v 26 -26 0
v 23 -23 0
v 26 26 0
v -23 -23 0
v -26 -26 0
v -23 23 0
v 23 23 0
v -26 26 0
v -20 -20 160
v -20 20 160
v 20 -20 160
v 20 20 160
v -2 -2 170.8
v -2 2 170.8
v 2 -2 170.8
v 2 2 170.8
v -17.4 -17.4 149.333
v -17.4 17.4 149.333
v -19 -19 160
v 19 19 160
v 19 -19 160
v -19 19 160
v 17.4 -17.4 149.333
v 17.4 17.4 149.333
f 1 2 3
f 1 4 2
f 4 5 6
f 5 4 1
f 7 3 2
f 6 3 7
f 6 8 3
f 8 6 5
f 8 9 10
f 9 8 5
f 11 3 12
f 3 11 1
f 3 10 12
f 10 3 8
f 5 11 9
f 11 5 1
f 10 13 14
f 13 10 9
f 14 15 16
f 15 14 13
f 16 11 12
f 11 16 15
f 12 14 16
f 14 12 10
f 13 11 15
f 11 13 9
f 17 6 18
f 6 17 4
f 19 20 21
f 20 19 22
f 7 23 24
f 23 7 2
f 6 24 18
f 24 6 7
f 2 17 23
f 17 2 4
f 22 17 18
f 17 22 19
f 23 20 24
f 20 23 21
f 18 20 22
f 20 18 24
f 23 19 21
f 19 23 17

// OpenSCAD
// ======================================================
// Dice Tower (tapered shell) + DIAGONAL baffles (wall-to-wall)
// Baffles tilt across X (rotate about Y) and alternate each level
// ======================================================
$fn = 64;

// ---------- Tower geometry ----------
tower_h       = 160;   // body height (not counting cap)
outer_w_bot   = 52;    // outer width at base
outer_w_top   = 40;    // outer width at top
wall          = 3;     // wall thickness
cap_h         = 18;    // little pyramid cap

// Inner chute (constant rectangle, centered)
chute_w       = 32;    // X (give chunky d20s room)
chute_d       = 32;    // Y

// Exit opening (front = +Y)
base_clear_h  = 22;
exit_w        = 34;
exit_h        = 20;

// Funnel at top
funnel_h      = 20;
funnel_over   = 3;

// ---------- Baffles (DIAGONAL across X) ----------
num_baffles       = 6;
baffle_t          = 3.0;   // slightly thicker for robustness
baffle_angle_deg  = 15;     // slope across X (left high → right low, then flip)
baffle_margin     = 10;     // top/bottom margin before first/after last
y_clear_from_wall = 1.5;    // clearance from front/back walls (Y)
 x_overlap         = 1.0;    // small penetration into wall to avoid boolean slivers
baffle_max_width  = 18;     // max baffle width to prevent jamming

// ---------- helpers ----------
module taper(wb, wt, h){ linear_extrude(h, scale=wt/wb) square([wb,wb], center=true); }
function iw_bot() = outer_w_bot - 2*wall;
function iw_top() = outer_w_top - 2*wall;
function inner_w_at_z(z) = iw_bot() + (iw_top() - iw_bot()) * (z / tower_h);

// ---------- outer shell ----------
module outer_shell(){
  union(){
    taper(outer_w_bot, outer_w_top, tower_h);
    // Replace polyhedron cap with a short flat-ish cap to avoid fragile apex
    translate([0,0,tower_h])
      taper(outer_w_top, 4.0, cap_h*0.6); // small flat cap rather than a sharp point
  }
}

// ---------- subtractions ----------
module inner_cavity_taper(){ taper(iw_bot(), iw_top(), tower_h); }
module main_chute(){ linear_extrude(tower_h) square([chute_w, chute_d], center=true); }
module exit_window(){
  translate([0,0,base_clear_h + exit_h/2])
    rotate([90,0,0]) cube([exit_w, wall*2+0.2, exit_h], center=true);
}
module top_funnel(){
  fw_top = chute_w + 2*funnel_over;
  fw_bot = iw_top() - 2;
  fh     = min(funnel_h, tower_h*0.35);
  translate([0,0,tower_h - fh]) taper(fw_bot, fw_top, fh);
}

// ---------- DIAGONAL baffles (tilt across X, alternate) ----------
module baffles_diagonal(){
  usable_h = (tower_h - base_clear_h) - 2*baffle_margin;
  spacing  = usable_h / max(num_baffles,1);

  // size in Y (front/back) – centered with a small gap to both walls
  len_y = chute_d - 2*y_clear_from_wall;

  for(i=[0:num_baffles-1]){
    zc   = base_clear_h + baffle_margin + spacing*(i+0.5);
    iw_z = inner_w_at_z(zc);             // inner width between side walls at this Z

    // PROPER FIX: Baffles must attach to walls to be printable
    // Alternate between left-wall and right-wall attachment
    // Each baffle spans from one wall partway across, leaving flow gap on opposite side
    
    // Safety clamp: ensure flow gap is large enough for common D20s.
    // gap = chute_w - len_x  => enforce gap >= safe_d20 + clearance
    safe_d20   = 22.5;    // typical tip-to-tip diagonal for D20 (mm)
    clearance  = 0.5;     // extra wiggle room (mm)
  // maximum allowed baffle length so the remaining gap fits a D20
  max_len_allowed = max([0, chute_w - (safe_d20 + clearance)]);

  // clamp also by the local inner width at this Z to avoid overhanging into the tapered shell
  // leave a small margin so baffles don't butt exactly at the wall edge
  small_margin = 2.0;
  cap_by_inner = max([0, iw_z - small_margin]);

  // final baffle length: pick the desired coverage, clamp by D20, max width, and inner width;
  // ensure a tiny positive minimum so cube() never gets a zero size
  len_x = max([0.1, min([chute_w * 0.4, max_len_allowed, baffle_max_width, cap_by_inner])]);

    // Add a tiny positive overlap into the wall to avoid boolean slivers (use x_overlap if set)
    wall_penetration = max([0, x_overlap]);

    // compute x_offset so the baffle visibly attaches to the INNER wall at this Z
    inner_half = iw_z / 2;
    left_face  = -inner_half - wall_penetration; // a bit into the inner wall
    right_face =  inner_half + wall_penetration;
    x_offset = (i % 2 == 0) ?
      left_face + len_x/2 :   // Even: attach to LEFT inner wall
      right_face - len_x/2;   // Odd: attach to RIGHT inner wall

    // alternate slope across X: even -> left high/right low, odd -> reverse
    sign = (i % 2 == 0) ? 1 : -1;
    tilt = sign * baffle_angle_deg;

    // Single diagonal baffle - attached to alternating walls
    translate([x_offset, 0, zc])
      rotate([0, tilt, 0])
        cube([len_x, len_y, baffle_t], center=true);
  }
}

// ---------- assembly ----------
difference(){
  union(){
    outer_shell();
    // include internal shelves so they remain after subtraction
    baffles_diagonal();
  }
  inner_cavity_taper();
  main_chute();    // ensures a straight chute inside the tapered shell
  exit_window();
  top_funnel();
}

/* Tuning:
- Want a stronger slope?   baffle_angle_deg = 18–20
- Easier bridging?         baffle_t = 3.0
- More room for big dice?  chute_w = chute_d = 34
- Shelves touching side walls more obviously? increase x_overlap to 1.0
- If you prefer the “front/back hug” style instead, tell me and I’ll swap the
  tilt axis (rotate about X) and add the exact Y wall gap computation.
*/

// ---------- test slice helper ----------
// Renders a short vertical slice of the tower (0..slice_h mm) for test-printing
module test_slice(slice_h = 50){
  // render the final assembled tower, then clip with an intersection cube
  intersection(){
    // full model
    difference(){
      union(){ outer_shell(); baffles_diagonal(); }
      inner_cavity_taper();
      main_chute();
      exit_window();
      top_funnel();
    }
    // clipping box
    translate([-100,-100,0])
      cube([200,200,slice_h], center=false);
  }
}
